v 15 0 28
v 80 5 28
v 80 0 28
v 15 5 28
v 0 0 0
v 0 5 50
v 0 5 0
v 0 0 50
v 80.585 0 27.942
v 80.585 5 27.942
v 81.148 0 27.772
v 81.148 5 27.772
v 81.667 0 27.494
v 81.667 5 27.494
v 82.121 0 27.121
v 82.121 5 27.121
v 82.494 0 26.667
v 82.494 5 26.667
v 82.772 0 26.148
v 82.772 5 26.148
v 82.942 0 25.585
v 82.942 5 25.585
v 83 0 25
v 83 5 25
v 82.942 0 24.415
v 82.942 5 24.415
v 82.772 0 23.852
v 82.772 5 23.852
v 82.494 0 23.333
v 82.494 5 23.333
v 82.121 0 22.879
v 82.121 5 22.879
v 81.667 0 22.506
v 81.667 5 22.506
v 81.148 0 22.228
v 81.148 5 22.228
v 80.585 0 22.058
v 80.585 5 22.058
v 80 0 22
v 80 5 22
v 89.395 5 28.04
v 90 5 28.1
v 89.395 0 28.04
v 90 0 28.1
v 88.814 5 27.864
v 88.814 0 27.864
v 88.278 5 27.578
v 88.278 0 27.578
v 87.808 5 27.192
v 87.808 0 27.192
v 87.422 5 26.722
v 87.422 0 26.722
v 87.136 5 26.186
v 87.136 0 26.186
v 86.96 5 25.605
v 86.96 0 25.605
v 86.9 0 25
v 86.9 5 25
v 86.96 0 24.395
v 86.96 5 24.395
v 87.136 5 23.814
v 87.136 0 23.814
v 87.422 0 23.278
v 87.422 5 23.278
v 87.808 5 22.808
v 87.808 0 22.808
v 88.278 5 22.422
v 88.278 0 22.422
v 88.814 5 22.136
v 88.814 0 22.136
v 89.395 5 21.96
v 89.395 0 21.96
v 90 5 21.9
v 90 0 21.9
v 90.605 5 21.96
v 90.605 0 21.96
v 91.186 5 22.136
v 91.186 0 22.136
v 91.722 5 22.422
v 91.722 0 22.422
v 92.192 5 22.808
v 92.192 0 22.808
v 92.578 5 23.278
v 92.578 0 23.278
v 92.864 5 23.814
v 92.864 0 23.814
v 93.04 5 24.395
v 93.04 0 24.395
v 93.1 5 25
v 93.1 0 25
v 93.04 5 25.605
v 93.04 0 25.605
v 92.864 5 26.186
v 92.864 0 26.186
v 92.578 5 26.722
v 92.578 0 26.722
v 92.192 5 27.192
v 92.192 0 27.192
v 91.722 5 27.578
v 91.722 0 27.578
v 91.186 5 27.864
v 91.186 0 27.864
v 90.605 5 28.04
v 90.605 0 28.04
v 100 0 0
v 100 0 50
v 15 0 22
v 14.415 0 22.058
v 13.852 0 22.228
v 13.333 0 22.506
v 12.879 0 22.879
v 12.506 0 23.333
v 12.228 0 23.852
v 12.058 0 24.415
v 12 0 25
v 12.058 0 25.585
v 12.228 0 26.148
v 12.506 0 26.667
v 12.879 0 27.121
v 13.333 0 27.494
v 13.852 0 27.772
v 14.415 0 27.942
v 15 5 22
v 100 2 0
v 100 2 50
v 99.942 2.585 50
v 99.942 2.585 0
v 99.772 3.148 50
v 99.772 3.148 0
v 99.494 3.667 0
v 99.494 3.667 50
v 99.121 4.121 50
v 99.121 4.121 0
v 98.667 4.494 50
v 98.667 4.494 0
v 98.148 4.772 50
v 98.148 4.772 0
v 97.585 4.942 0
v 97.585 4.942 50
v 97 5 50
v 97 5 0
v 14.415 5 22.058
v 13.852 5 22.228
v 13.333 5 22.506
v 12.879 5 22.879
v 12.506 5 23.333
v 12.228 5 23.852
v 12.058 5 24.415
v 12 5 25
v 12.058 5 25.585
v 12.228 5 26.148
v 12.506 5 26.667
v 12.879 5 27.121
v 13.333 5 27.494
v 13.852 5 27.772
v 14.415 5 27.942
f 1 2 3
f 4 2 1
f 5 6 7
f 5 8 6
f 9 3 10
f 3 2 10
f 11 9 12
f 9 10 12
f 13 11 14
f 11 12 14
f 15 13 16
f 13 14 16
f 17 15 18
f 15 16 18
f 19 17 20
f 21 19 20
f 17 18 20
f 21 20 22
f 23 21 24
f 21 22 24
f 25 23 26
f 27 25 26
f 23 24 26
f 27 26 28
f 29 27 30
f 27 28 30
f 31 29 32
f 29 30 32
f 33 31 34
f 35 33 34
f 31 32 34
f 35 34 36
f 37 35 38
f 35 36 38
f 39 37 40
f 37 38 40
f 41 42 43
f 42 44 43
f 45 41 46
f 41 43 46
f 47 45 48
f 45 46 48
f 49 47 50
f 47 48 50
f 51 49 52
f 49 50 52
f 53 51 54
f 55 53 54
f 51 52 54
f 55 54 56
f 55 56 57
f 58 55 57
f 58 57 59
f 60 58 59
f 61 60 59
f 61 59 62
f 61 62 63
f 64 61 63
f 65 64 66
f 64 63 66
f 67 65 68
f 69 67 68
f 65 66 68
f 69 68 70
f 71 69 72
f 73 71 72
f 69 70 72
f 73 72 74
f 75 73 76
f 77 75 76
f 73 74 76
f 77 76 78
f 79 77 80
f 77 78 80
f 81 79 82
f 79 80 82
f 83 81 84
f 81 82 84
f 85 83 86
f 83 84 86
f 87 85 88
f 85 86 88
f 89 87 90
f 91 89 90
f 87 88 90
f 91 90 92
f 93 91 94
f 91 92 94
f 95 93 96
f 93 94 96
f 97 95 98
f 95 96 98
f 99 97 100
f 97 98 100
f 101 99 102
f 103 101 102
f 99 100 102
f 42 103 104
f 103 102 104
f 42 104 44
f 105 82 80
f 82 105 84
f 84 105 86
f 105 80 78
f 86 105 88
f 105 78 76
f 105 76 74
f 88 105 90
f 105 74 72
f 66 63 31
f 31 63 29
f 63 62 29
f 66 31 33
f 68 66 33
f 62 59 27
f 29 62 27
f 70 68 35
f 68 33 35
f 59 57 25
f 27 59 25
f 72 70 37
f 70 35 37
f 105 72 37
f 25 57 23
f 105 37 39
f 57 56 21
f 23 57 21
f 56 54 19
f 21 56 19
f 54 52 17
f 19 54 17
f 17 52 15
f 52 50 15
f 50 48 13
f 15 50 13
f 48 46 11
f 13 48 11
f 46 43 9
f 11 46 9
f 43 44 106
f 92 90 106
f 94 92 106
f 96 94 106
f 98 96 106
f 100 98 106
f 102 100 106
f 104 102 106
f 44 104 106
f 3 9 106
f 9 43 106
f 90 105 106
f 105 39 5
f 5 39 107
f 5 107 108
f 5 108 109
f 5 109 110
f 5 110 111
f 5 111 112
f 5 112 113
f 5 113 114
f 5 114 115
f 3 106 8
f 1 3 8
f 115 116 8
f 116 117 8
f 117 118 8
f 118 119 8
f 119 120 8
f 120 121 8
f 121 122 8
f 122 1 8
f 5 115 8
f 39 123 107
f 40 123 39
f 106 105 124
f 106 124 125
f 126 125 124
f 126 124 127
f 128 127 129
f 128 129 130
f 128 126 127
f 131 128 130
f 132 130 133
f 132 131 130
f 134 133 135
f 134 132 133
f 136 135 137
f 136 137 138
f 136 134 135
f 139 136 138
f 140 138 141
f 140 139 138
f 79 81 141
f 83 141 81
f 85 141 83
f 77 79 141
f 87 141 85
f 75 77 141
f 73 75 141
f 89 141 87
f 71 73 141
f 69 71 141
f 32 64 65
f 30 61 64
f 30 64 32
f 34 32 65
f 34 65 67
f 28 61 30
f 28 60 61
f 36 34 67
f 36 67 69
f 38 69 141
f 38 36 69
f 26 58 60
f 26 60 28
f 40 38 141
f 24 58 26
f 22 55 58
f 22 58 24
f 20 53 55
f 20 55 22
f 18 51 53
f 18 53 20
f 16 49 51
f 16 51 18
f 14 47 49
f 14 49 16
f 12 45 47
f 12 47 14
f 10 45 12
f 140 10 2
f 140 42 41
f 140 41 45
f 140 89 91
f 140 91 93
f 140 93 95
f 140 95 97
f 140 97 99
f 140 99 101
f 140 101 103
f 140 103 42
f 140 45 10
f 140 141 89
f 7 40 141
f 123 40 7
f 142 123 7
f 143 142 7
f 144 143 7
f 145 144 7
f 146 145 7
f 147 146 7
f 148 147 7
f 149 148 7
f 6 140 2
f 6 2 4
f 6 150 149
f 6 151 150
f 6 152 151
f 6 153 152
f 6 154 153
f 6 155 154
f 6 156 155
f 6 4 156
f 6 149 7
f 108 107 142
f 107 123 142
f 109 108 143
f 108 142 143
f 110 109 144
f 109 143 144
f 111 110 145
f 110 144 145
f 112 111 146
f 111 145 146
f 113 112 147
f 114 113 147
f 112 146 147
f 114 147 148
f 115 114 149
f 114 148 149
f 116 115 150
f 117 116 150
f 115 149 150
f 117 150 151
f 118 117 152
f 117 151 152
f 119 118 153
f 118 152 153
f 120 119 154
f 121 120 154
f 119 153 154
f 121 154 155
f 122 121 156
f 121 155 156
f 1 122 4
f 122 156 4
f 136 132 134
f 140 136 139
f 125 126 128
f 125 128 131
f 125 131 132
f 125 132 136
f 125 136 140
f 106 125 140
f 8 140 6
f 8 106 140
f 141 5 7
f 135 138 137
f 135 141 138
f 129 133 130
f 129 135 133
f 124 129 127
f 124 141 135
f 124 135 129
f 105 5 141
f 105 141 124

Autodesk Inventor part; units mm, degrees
ref_plane "YZ Plane" through (0, 0, 0) normal (1, 0, 0) x (0, 1, 0)
sketch "Sketch1" plane through (0, 0, 0) normal (0, 1, 0) x (-1, 0, 0)
  line L0 (0, 0) -> (-100, 0)
  line L1 (-100, 0) -> (-100, 50)
  line L2 (-100, 50) -> (0, 50)
  line L3 (0, 50) -> (0, 0)
  point P0 (-50, 0)
  point P1 (-90, 25)
  dimension "d0" = 100
  dimension "d1" = 50
  dimension "d24" = 10
  dimension "d25" = 25
extrude "Extrusion1" add sketch "Sketch1" along normal blind 5
sketch "Sketch2" plane through (0, 5, 0) normal (0, 1, 0) x (1, 0, 0)
  line L0 (0, -50) -> (100, -50) construction
  line L1 (100, -50) -> (100, 0) construction
  line L2 (100, 0) -> (0, 0) construction
  line L3 (0, 0) -> (0, -50) construction
  line L4 (80, -25) -> (15, -25) construction
  arc A0 (80, -28) -> (80, -22) centre (80, -25) ccw
  arc A1 (15, -22) -> (15, -28) centre (15, -25) ccw
  line L5 (15, -22) -> (80, -22)
  line L6 (80, -28) -> (15, -28)
  point P0 (50, -50)
  dimension "d7" = 65
  dimension "d8" = 25
  dimension "d9" = 15
  dimension "d10" = 6
  dimension "dia" = 6
extrude "Extrusion2" cut sketch "Sketch2" against normal blind 5
sketch "Sketch5" plane through (0, 5, 0) normal (0, 1, 0) x (1, 0, 0)
  line L0 (0, -50) -> (100, -50) projected
  line L1 (100, -50) -> (100, 0) projected
  point P0 (0, 0)
  point P1 (90, -25)
  dimension "d33" = 25
  dimension "d34" = 10
hole "Hole1" at (90, 5, 25) direction (0, -1, 0) diameter 6.2 end through all
thread "Thread1" size "M6x1" class "6H" standard "ANSI Metric M Profile" full length
ref_plane "Work Plane1" through (100, 5, 5) normal (0, 0, -1) x (-1, 0, 0)
ref_plane "Work Plane2" through (0, 5, 45) normal (0, 0, 1) x (1, 0, 0)
fillet "Fillet1" radius 3 1 edges at (100, 5, 25)
equation "\"d10\" = dia"
properties part number "Horonyrogzito"
